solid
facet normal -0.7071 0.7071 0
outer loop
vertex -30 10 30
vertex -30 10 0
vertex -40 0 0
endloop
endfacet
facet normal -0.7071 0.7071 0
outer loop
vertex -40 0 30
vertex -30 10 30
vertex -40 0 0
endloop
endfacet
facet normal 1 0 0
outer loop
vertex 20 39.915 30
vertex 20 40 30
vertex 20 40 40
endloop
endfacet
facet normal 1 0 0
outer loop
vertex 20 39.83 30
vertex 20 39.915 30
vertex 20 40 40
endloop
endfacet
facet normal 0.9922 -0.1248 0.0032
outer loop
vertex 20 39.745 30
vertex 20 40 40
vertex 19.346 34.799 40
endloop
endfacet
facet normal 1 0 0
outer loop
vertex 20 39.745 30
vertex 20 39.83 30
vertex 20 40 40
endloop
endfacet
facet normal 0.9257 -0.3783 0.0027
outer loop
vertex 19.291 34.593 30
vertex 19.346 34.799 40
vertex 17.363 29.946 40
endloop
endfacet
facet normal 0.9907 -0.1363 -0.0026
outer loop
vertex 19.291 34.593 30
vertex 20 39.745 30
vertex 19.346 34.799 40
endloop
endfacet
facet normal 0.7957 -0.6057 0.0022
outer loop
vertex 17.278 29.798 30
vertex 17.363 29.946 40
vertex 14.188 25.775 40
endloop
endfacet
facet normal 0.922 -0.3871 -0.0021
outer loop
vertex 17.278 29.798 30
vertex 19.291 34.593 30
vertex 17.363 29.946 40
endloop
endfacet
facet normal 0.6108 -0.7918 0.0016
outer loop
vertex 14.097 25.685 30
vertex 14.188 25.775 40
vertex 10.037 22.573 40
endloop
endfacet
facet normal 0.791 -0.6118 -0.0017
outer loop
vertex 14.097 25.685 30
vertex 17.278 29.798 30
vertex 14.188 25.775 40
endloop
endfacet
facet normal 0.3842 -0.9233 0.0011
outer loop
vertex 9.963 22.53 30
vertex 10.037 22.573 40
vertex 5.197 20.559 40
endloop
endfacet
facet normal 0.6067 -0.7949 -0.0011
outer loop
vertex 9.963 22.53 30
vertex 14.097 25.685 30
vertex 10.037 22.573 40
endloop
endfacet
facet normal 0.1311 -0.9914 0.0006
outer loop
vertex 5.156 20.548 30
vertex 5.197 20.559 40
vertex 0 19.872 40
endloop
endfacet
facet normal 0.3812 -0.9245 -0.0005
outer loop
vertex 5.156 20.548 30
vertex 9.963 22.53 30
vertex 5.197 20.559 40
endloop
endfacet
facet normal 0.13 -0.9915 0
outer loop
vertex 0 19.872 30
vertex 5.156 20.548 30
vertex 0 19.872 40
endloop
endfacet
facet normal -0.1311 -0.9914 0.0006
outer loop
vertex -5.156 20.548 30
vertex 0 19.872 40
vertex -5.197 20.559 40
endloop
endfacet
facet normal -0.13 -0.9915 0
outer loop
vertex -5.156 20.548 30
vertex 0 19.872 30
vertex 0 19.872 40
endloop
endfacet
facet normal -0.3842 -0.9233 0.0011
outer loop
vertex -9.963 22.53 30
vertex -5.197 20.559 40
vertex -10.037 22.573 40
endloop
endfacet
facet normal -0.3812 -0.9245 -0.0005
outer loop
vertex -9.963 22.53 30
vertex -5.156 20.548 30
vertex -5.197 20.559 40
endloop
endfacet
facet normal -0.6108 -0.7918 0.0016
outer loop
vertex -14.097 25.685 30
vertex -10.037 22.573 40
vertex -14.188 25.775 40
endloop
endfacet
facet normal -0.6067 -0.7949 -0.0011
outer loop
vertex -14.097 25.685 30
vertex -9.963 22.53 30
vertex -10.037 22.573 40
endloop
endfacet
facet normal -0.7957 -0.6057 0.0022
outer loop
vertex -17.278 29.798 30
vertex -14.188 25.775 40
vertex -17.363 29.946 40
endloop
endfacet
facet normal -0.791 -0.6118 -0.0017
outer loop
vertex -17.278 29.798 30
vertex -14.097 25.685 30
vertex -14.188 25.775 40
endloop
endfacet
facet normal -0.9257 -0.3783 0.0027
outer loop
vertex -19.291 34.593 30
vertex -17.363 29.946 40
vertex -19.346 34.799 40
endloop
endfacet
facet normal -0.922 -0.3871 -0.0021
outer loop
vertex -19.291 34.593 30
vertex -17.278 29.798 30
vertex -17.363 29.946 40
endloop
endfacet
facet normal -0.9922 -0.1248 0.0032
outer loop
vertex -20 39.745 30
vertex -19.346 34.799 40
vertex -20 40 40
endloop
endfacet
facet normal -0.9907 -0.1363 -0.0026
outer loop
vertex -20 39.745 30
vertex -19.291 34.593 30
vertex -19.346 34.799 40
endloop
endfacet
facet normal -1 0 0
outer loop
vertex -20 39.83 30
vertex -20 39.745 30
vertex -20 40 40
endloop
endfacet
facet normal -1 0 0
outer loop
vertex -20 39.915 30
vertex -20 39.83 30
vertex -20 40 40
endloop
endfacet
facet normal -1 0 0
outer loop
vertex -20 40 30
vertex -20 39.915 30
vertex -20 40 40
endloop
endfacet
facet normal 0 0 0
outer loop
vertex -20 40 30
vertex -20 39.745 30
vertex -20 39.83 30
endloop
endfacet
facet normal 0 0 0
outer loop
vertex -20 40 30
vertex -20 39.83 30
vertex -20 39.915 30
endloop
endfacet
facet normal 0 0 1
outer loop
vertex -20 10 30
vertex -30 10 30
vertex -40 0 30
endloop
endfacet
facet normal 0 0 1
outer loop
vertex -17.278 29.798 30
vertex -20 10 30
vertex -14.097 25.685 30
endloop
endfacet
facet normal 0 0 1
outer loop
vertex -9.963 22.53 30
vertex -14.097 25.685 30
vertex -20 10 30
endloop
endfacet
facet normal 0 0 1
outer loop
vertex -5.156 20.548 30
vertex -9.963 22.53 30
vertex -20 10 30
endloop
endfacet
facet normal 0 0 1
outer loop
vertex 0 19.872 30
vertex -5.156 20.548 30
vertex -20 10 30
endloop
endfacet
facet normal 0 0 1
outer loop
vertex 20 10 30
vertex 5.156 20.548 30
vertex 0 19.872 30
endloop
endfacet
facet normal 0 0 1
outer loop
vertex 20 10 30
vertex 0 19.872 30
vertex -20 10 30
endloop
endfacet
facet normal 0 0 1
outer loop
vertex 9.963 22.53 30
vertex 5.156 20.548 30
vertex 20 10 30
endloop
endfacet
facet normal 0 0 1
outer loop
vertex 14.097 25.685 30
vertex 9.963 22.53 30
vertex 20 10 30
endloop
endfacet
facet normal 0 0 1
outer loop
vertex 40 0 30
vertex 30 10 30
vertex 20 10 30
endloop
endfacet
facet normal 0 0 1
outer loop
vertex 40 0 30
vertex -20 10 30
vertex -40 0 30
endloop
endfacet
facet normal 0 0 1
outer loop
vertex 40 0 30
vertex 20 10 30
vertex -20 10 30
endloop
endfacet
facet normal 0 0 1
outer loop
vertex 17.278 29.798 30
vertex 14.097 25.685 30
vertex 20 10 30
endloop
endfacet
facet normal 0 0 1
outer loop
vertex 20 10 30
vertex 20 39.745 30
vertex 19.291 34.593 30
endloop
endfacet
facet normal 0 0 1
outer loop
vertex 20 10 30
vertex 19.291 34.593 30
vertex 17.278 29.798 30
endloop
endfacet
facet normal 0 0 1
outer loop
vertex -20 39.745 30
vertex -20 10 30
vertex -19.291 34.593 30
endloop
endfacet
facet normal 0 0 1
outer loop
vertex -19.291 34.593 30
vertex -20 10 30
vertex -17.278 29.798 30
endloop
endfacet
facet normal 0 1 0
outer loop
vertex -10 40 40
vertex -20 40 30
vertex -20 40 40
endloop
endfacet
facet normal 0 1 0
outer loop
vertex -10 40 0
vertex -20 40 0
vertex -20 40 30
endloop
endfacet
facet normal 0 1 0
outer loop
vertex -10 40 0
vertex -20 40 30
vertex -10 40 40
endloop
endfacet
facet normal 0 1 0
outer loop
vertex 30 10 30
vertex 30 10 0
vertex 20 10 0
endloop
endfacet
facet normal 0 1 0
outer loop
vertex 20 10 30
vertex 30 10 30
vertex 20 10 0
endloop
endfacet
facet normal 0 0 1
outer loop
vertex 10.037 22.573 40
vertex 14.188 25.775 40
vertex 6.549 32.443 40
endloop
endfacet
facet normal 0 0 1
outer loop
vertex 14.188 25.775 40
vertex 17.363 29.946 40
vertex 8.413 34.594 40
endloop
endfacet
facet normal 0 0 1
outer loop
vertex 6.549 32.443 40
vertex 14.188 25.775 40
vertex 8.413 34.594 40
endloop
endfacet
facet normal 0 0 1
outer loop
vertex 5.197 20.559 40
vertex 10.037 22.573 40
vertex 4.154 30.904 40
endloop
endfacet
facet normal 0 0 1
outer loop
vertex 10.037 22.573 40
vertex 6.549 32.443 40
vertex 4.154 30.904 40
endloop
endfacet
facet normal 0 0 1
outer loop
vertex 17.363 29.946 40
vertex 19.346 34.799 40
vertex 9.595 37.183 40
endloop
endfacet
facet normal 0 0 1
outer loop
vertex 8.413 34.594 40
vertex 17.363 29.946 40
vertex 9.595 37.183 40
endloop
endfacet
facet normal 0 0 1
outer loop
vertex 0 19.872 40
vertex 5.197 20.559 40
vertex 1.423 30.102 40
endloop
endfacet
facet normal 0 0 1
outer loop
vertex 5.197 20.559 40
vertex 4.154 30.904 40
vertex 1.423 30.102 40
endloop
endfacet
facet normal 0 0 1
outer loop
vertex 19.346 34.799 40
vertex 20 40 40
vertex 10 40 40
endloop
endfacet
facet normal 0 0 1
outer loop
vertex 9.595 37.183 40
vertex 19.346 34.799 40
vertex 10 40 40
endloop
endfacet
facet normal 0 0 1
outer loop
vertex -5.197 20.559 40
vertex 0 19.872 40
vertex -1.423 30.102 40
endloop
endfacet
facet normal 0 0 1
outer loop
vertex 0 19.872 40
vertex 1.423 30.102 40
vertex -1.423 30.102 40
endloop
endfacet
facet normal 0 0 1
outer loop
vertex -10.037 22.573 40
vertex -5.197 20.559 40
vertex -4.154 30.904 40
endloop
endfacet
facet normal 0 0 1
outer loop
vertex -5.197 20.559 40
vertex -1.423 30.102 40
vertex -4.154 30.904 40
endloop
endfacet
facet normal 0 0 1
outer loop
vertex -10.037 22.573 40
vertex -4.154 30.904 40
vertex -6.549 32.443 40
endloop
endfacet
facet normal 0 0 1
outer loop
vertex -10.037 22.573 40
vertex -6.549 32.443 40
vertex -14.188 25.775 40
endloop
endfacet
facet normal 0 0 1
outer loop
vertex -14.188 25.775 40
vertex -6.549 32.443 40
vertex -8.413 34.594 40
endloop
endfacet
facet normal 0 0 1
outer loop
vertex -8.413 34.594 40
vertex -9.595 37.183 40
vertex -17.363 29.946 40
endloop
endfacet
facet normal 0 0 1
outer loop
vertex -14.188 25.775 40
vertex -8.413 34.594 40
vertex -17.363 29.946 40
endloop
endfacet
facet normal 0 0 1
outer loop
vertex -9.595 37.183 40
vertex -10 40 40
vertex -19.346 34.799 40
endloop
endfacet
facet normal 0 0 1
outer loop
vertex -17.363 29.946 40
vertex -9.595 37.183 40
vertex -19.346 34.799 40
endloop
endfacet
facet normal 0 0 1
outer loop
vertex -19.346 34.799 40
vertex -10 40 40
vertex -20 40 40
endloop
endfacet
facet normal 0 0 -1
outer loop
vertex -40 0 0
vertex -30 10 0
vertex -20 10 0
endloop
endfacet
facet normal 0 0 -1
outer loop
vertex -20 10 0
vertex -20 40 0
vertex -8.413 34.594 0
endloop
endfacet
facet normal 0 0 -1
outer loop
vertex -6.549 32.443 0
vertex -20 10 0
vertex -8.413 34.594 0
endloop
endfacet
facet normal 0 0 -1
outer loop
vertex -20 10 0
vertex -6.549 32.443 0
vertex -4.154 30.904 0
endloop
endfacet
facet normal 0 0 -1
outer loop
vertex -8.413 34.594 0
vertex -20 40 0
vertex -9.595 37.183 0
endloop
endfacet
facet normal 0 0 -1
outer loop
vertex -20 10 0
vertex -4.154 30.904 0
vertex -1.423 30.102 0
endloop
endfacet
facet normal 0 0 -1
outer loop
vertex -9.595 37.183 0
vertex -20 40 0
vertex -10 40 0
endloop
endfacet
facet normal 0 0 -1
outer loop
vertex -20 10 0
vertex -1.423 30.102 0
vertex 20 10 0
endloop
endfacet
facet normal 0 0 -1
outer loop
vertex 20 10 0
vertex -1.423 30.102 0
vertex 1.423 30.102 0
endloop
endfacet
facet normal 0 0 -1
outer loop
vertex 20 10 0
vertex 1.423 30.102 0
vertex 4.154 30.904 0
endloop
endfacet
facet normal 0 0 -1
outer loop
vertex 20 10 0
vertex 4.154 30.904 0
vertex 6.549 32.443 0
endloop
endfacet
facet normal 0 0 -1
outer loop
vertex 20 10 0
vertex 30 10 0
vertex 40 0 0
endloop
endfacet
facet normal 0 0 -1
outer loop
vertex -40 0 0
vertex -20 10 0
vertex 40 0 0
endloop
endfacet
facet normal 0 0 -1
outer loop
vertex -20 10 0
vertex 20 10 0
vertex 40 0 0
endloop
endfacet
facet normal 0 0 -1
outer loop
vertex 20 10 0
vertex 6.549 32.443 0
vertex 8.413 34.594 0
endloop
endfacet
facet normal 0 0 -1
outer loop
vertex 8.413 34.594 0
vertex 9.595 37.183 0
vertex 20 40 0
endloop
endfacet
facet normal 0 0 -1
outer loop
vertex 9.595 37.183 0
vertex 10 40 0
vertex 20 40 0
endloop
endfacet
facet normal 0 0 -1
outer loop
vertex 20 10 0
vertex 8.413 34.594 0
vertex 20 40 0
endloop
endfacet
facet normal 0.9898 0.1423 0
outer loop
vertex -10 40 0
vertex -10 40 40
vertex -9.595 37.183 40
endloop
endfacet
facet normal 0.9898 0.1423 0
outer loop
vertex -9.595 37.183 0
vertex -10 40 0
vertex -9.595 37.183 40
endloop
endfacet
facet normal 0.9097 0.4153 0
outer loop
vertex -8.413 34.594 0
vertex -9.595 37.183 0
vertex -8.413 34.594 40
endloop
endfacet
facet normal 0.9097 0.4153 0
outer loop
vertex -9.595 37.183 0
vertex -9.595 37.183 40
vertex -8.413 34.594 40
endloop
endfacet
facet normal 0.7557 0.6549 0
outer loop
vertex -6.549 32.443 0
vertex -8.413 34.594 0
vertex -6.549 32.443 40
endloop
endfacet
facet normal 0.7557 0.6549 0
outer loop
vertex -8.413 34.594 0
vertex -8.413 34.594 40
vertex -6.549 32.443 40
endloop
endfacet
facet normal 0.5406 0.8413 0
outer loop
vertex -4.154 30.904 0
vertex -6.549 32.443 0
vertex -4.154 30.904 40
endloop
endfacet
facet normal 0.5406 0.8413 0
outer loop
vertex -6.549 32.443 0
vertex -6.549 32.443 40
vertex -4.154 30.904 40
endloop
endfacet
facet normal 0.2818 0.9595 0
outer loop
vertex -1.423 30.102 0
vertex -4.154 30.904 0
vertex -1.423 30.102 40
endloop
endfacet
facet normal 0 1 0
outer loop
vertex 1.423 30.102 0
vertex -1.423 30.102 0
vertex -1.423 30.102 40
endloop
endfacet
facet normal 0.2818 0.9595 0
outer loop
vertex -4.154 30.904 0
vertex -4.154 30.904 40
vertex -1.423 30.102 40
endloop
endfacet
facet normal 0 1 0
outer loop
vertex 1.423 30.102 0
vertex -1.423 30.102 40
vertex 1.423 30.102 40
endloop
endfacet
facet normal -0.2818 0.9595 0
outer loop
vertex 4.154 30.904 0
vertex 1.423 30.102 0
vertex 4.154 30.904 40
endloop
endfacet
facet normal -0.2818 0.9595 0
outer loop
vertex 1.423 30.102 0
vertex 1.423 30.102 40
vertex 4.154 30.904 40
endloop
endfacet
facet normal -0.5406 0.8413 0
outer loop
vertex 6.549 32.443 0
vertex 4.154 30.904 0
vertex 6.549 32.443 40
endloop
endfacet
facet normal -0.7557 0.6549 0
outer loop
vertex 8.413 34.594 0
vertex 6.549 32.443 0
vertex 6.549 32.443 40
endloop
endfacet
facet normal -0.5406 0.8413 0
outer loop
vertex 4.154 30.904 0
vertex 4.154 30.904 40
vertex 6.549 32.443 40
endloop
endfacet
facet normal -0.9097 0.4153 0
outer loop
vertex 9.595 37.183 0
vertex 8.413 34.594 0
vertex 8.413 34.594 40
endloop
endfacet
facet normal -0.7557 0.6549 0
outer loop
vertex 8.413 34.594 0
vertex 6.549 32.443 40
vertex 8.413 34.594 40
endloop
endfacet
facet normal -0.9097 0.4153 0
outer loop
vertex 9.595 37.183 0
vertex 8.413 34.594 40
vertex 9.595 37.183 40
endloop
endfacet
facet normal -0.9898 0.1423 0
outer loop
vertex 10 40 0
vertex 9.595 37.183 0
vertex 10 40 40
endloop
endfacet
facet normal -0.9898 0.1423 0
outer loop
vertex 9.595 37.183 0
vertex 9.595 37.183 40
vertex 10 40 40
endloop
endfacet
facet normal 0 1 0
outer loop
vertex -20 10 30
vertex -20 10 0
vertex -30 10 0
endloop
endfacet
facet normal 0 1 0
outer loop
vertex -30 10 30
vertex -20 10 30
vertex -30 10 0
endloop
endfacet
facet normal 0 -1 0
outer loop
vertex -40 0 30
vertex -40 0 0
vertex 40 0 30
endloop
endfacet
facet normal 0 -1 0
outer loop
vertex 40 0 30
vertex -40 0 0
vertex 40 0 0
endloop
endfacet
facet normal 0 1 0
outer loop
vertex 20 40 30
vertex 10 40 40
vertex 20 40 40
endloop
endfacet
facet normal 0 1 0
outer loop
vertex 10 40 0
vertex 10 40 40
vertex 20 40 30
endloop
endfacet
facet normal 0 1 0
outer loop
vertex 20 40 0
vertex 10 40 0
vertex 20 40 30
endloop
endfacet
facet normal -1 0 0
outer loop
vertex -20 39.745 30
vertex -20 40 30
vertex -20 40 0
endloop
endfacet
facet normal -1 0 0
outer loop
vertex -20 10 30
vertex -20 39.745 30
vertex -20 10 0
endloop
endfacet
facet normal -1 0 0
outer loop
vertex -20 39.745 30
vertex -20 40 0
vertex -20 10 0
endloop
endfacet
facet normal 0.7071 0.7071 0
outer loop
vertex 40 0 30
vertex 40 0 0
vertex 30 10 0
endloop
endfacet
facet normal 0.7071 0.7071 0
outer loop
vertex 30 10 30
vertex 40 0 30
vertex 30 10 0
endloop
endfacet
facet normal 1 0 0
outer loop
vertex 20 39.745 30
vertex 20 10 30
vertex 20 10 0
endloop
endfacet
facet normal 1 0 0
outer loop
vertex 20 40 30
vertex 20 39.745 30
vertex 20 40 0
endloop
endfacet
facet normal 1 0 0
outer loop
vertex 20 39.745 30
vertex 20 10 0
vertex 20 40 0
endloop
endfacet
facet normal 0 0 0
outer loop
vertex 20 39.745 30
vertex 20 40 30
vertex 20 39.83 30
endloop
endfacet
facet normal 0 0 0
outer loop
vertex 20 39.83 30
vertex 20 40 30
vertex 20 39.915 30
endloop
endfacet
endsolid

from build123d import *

# Parameters (mm, degrees)
EXTRUDE_1_DEPTH     = 30
EXTRUDE_2_DEPTH     = 10
CUT_EXTRUDE_1_DEPTH = 70


with BuildPart() as part:
    # 草圖1 → 填料-伸長1 (new body)
    with BuildSketch(Plane.XY):
        Polygon((-40, 0), (40, 0), (30, 10), (20, 10), (20, 40), (-20, 40), (-20, 10), (-30, 10), align=None)
    extrude(amount=EXTRUDE_1_DEPTH)

    # 草圖2 → 填料-伸長2 (add)
    with BuildSketch(Plane.XY.offset(30)):
        with BuildLine():
            Line((-20, 40), (20, 40))
            ThreePointArc((20, 40), (0, 19.871866441), (-20, 40))
        make_face()
    extrude(amount=EXTRUDE_2_DEPTH)

    # 草圖3 → 除料-伸長1 (cut)
    with BuildSketch(Plane.XY.offset(40)):
        with BuildLine():
            Line((10, 40), (-10, 40))
            ThreePointArc((-10, 40), (0, 30), (10, 40))
        make_face()
    extrude(amount=-CUT_EXTRUDE_1_DEPTH, mode=Mode.SUBTRACT)


solid = part.part
